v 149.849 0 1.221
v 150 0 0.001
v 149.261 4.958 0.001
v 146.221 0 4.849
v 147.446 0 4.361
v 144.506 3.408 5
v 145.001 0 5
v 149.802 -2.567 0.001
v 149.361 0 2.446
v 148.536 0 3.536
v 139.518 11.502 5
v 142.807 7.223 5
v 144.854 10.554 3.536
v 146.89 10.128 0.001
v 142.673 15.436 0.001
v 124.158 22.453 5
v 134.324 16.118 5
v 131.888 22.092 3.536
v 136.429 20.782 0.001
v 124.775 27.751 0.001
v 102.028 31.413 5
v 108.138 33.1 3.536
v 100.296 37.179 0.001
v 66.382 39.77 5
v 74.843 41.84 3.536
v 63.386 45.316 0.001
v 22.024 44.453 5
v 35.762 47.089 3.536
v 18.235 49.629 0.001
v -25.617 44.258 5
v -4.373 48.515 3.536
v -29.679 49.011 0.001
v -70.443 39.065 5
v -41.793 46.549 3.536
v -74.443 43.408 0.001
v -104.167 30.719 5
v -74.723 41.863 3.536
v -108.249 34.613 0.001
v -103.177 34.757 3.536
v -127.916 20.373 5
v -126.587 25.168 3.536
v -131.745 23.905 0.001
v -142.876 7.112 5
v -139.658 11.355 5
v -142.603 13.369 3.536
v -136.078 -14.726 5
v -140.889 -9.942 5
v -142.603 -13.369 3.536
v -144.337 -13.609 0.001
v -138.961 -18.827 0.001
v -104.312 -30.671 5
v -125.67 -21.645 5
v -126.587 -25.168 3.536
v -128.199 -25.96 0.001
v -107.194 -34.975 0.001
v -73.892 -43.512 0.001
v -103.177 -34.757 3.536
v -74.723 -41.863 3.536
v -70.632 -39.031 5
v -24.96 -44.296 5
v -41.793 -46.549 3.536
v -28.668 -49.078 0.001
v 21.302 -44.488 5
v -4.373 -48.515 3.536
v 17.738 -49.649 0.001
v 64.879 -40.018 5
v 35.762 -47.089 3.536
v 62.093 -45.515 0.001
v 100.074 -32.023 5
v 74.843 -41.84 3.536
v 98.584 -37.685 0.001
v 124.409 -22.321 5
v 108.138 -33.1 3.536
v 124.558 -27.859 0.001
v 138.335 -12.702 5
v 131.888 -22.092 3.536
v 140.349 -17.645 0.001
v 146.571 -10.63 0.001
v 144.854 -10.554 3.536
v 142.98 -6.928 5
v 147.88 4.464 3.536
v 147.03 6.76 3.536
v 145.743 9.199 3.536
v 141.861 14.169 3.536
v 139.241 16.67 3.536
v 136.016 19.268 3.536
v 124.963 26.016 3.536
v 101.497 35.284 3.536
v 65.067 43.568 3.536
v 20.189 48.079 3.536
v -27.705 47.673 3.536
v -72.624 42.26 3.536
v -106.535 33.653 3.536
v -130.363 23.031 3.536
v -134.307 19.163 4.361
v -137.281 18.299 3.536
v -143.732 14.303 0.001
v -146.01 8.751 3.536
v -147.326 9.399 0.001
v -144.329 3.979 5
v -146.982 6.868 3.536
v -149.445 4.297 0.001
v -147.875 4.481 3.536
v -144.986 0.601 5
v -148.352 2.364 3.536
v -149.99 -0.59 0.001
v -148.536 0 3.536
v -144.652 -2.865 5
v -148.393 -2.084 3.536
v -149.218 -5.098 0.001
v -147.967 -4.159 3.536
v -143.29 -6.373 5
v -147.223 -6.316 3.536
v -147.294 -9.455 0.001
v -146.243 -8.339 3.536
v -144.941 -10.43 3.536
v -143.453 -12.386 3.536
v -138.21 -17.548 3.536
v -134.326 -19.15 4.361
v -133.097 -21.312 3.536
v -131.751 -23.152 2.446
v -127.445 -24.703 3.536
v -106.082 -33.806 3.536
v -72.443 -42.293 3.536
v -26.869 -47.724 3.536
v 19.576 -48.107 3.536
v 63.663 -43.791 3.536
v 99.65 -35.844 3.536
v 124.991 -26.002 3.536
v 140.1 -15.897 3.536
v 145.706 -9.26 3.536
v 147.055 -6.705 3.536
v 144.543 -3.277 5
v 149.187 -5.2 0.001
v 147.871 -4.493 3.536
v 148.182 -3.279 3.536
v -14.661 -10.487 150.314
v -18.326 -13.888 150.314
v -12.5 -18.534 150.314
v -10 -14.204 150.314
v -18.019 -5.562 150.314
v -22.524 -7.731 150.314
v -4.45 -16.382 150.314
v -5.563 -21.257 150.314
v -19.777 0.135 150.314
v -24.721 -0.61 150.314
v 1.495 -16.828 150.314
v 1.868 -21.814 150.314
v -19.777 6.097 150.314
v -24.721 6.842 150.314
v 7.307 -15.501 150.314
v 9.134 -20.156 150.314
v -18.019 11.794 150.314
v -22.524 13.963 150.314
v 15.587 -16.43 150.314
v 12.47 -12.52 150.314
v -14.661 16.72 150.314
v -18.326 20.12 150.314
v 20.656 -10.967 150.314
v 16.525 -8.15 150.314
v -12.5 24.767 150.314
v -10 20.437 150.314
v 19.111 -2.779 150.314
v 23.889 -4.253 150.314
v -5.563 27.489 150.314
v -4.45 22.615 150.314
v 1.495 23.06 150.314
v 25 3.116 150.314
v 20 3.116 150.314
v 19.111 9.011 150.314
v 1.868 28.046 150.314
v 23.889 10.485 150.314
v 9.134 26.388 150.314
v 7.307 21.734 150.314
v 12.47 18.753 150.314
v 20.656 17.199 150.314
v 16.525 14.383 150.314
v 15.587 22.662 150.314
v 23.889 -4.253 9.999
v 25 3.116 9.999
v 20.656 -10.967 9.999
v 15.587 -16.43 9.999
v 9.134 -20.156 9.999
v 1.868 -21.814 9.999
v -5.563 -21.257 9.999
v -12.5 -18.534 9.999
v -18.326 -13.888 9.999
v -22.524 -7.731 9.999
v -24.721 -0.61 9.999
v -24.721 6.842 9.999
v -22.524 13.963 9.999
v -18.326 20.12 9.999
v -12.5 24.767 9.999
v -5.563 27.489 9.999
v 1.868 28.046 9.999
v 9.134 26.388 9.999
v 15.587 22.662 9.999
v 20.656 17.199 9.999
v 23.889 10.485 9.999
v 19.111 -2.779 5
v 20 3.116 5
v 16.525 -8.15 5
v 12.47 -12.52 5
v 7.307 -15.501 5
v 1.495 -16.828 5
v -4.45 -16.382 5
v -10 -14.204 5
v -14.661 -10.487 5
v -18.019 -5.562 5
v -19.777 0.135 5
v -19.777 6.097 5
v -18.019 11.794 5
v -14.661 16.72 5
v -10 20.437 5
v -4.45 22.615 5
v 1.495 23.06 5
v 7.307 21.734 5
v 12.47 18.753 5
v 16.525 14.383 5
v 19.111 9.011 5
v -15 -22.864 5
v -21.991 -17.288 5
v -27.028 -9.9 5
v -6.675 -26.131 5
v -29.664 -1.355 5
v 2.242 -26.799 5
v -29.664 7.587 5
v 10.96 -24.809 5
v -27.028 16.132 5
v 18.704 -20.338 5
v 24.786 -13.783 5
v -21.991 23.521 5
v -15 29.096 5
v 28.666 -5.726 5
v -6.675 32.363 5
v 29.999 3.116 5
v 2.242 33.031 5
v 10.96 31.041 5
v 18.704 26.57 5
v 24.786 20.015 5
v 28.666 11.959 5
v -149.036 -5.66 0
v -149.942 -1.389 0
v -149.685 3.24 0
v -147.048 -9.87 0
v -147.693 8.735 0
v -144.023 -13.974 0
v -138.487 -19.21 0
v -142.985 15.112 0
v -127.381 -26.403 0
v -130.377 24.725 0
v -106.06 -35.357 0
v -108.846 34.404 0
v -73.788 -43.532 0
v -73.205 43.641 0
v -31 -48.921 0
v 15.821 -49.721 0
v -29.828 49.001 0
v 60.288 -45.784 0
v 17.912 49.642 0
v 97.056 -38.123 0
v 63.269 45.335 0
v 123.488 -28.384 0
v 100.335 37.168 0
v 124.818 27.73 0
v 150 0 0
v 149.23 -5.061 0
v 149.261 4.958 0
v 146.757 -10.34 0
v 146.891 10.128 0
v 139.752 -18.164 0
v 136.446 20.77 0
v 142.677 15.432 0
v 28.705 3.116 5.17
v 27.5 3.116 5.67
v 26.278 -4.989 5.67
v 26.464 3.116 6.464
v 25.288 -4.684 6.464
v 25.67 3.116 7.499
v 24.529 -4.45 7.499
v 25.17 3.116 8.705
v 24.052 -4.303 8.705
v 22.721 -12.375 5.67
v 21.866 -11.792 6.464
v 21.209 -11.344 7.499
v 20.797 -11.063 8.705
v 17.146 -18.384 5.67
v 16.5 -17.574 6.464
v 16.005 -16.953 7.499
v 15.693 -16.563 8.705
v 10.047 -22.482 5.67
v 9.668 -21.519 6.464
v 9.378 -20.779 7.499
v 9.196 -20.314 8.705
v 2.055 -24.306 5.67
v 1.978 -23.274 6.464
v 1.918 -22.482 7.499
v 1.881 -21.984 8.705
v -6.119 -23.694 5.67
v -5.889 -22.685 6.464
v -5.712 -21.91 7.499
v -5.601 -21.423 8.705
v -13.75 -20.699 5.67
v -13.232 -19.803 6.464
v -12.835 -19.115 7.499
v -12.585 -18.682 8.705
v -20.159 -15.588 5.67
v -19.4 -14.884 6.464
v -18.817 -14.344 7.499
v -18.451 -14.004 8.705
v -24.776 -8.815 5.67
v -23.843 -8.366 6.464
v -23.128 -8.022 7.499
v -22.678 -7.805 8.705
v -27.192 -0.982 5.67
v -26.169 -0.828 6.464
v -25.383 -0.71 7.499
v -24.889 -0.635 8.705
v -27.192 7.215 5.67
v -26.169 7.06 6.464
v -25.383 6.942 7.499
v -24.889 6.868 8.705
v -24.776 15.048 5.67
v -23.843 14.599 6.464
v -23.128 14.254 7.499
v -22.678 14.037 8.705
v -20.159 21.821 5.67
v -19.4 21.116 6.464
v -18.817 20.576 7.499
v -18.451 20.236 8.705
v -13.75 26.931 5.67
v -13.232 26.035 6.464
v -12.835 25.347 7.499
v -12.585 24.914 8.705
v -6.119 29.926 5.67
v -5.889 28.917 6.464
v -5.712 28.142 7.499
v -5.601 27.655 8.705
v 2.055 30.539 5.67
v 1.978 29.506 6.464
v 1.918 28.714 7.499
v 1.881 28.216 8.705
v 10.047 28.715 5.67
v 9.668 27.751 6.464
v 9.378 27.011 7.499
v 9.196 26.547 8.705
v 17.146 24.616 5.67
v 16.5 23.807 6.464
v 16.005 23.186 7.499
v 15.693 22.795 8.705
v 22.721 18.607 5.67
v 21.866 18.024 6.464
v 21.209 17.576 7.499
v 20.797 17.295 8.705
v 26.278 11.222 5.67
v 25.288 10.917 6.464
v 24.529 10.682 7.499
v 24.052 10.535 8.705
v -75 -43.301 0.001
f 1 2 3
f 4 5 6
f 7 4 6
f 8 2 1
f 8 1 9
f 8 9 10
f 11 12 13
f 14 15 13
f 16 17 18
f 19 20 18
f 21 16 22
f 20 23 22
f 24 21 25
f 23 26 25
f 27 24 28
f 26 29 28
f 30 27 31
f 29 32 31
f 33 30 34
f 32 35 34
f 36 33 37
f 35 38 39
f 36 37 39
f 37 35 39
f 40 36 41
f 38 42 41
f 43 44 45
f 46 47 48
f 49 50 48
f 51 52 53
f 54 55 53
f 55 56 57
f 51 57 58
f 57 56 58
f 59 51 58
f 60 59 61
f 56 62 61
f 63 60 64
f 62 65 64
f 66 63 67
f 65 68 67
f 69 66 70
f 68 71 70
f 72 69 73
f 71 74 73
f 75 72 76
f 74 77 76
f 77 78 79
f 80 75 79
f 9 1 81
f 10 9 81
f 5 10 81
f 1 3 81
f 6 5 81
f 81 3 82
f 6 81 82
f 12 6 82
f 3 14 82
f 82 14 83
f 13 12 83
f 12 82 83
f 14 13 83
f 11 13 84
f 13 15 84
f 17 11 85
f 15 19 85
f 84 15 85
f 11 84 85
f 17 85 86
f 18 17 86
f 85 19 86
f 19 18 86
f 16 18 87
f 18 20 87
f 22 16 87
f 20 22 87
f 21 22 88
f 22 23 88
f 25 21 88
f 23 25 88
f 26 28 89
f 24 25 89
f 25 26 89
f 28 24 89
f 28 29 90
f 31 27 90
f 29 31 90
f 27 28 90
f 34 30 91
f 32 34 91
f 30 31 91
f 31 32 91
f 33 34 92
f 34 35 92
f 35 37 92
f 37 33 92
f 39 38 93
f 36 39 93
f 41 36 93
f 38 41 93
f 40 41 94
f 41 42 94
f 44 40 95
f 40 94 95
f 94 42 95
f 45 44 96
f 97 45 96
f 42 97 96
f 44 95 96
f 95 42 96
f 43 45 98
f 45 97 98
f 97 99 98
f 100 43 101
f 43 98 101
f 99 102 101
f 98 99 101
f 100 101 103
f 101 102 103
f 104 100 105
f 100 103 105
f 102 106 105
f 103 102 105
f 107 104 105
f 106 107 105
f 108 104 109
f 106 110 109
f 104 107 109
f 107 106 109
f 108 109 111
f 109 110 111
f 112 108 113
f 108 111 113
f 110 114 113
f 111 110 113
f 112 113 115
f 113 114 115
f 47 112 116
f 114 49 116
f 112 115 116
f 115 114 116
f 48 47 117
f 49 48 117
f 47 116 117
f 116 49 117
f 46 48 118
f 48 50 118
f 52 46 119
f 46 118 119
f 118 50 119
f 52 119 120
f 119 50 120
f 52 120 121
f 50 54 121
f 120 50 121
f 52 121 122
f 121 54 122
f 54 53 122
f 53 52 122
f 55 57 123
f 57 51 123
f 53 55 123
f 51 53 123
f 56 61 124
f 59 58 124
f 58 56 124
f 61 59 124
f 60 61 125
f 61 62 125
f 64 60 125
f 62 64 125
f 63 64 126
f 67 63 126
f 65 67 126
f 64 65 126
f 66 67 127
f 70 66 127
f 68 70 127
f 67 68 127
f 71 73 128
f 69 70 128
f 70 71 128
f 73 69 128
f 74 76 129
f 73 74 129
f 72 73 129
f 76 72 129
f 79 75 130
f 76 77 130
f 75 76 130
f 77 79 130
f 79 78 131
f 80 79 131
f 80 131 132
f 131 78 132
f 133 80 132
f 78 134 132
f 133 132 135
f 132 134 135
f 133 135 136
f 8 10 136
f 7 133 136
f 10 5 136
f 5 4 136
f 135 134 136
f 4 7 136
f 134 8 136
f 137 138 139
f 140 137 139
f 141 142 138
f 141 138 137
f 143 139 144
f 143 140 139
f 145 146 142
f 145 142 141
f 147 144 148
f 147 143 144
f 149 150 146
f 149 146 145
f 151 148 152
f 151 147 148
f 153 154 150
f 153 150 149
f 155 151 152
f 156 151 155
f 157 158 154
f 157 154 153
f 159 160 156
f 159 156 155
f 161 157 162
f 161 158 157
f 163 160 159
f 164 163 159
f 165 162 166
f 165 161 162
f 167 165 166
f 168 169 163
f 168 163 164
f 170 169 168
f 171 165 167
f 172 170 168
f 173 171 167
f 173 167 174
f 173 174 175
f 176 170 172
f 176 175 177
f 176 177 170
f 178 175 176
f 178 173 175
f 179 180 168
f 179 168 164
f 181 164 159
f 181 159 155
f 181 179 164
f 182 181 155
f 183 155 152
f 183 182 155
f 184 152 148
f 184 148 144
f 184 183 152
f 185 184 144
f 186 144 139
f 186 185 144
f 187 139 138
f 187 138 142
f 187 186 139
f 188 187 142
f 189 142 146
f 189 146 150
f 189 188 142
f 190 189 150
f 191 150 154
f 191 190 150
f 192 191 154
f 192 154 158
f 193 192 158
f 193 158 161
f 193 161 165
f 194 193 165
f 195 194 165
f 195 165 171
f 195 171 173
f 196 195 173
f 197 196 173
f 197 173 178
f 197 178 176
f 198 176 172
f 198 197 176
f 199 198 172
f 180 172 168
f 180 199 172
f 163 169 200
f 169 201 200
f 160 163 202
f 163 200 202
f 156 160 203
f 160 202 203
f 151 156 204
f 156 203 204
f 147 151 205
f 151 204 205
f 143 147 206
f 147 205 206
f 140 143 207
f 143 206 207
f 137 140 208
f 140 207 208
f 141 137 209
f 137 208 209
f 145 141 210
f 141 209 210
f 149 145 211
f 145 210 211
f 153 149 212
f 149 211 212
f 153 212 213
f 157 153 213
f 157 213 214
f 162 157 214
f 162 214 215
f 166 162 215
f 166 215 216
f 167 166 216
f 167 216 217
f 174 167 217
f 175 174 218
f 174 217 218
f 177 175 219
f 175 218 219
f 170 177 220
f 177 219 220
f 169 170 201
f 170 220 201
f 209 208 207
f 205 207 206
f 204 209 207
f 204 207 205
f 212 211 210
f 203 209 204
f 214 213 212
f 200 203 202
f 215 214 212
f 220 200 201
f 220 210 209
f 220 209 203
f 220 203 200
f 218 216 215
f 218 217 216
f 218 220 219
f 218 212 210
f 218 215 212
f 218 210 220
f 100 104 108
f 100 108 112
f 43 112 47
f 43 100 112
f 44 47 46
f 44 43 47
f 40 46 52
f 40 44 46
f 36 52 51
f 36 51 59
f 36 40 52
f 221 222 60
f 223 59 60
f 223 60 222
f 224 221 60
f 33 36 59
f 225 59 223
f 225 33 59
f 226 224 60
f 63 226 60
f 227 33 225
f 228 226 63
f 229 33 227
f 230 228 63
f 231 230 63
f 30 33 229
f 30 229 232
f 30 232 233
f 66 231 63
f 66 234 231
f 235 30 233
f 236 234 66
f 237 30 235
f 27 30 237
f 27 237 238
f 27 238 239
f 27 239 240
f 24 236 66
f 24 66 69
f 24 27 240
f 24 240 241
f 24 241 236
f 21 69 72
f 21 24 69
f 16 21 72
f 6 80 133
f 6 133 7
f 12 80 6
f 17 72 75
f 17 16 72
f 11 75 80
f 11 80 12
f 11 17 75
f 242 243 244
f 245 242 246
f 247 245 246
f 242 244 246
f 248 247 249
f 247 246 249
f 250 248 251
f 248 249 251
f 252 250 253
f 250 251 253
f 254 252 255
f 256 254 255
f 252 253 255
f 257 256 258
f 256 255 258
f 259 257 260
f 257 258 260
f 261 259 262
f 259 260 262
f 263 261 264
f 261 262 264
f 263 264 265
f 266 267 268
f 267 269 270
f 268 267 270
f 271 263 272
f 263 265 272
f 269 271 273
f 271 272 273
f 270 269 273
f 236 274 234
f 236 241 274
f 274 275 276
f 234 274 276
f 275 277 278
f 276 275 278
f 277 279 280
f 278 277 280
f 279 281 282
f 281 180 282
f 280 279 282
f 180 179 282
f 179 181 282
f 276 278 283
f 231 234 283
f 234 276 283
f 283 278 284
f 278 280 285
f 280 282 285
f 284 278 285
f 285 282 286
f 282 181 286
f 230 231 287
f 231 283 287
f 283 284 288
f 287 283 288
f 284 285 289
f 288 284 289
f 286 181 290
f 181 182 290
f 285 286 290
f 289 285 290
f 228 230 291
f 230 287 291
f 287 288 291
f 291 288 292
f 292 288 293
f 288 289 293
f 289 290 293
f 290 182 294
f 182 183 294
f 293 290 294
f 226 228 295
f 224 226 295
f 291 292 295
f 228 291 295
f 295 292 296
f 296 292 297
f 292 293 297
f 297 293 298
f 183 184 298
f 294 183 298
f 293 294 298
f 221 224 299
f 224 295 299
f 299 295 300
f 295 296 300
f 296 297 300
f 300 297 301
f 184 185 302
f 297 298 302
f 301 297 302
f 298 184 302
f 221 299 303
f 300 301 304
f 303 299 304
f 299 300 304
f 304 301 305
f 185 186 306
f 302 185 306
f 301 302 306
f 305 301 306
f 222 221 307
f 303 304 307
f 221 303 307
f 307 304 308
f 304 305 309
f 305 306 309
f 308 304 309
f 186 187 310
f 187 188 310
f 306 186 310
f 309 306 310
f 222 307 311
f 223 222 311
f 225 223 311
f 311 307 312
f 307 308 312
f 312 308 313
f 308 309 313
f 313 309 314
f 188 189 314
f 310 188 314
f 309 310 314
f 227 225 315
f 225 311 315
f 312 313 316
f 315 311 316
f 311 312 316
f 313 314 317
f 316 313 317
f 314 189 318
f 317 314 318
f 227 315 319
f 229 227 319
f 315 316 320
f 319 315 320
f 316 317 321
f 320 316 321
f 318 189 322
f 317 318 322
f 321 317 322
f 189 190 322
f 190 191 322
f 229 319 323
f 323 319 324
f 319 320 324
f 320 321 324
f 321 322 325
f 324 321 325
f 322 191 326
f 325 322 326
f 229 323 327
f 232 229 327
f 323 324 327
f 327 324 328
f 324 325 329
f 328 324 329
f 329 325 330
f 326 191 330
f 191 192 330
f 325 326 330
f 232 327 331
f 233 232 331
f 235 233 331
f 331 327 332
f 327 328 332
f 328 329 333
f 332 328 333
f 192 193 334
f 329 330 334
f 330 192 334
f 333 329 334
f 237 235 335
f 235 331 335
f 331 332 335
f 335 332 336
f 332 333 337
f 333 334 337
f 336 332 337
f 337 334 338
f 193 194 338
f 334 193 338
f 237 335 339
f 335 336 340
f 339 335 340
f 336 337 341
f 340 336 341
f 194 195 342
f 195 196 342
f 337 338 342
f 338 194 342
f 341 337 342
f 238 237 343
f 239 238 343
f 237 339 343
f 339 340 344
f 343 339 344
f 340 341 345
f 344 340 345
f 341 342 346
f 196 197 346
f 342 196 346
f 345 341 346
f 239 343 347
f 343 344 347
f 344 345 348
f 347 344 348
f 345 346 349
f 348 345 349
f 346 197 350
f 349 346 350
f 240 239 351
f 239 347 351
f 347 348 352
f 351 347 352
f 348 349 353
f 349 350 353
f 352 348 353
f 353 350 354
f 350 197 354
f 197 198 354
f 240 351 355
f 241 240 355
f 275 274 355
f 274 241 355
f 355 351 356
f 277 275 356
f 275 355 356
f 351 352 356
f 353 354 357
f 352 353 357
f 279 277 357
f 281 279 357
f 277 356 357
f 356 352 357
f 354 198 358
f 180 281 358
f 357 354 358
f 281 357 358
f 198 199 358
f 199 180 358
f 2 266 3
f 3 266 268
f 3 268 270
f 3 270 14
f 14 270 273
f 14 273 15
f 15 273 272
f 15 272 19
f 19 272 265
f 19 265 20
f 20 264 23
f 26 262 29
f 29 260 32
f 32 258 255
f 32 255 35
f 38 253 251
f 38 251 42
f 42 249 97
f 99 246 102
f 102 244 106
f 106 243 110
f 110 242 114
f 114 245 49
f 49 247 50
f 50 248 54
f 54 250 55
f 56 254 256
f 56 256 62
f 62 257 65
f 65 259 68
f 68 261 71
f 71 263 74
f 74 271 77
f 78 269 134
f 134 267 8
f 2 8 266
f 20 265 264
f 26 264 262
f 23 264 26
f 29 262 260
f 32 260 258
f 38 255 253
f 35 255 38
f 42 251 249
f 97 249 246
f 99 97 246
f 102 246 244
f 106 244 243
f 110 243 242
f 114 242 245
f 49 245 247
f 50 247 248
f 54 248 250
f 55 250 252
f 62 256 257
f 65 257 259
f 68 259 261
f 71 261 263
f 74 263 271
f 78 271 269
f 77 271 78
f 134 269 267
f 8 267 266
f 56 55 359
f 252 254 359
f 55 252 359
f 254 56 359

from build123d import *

# Parameters (mm, degrees)
F2_R     = 25
F2_R_2   = 19.999999553
F5_DEPTH = 5
F6_R     = 4.999


# Not quite as in the source:
# - a fillet or chamfer is up to 0.001 mm smaller than in the source, because OpenCascade refuses the exact size


with BuildPart() as f4:
    # F4: sweep along a path in F3
    with BuildLine(Plane.XZ) as f4_path:
        Line((0, 150.3136307001), (0, 0))
    # F2 (on offset) → F4 (sweep)
    with BuildSketch(Plane.XY.offset(150)):
        with Locations((0, 3.1161449583)):
            Circle(F2_R)
        with Locations((0, 3.1161449583)):
            Circle(F2_R_2, mode=Mode.SUBTRACT)
    sweep(path=f4_path.line)

    # F0 (on Top) → F5 (join)
    with BuildSketch(Plane.XY):
        with BuildLine():
            add(Edge.make_bspline(
                [(150, 0), (150, 86.6025403784), (-75, 43.3012701892), (-300, 0), (-75, -43.3012701892), (150, -86.6025403784), (150, 0)],
                knots=[0, 0, 0, 2.0943951024, 2.0943951024, 4.1887902048, 4.1887902048, 6.2831853072, 6.2831853072, 6.2831853072], degree=2, weights=[1, 0.5, 1, 0.5, 1, 0.5, 1]))
        make_face()
    extrude(amount=F5_DEPTH)

    # F6 (radius 5 in the source; OpenCascade refuses exactly that, so slightly less here)
    f6_edges = [f4.edges().sort_by_distance(p)[0] for p in [
        (-150, 0.000863, 5),
        (-25, 3.116145, 5),
    ]]
    fillet(f6_edges, radius=F6_R)


solid = f4.part
